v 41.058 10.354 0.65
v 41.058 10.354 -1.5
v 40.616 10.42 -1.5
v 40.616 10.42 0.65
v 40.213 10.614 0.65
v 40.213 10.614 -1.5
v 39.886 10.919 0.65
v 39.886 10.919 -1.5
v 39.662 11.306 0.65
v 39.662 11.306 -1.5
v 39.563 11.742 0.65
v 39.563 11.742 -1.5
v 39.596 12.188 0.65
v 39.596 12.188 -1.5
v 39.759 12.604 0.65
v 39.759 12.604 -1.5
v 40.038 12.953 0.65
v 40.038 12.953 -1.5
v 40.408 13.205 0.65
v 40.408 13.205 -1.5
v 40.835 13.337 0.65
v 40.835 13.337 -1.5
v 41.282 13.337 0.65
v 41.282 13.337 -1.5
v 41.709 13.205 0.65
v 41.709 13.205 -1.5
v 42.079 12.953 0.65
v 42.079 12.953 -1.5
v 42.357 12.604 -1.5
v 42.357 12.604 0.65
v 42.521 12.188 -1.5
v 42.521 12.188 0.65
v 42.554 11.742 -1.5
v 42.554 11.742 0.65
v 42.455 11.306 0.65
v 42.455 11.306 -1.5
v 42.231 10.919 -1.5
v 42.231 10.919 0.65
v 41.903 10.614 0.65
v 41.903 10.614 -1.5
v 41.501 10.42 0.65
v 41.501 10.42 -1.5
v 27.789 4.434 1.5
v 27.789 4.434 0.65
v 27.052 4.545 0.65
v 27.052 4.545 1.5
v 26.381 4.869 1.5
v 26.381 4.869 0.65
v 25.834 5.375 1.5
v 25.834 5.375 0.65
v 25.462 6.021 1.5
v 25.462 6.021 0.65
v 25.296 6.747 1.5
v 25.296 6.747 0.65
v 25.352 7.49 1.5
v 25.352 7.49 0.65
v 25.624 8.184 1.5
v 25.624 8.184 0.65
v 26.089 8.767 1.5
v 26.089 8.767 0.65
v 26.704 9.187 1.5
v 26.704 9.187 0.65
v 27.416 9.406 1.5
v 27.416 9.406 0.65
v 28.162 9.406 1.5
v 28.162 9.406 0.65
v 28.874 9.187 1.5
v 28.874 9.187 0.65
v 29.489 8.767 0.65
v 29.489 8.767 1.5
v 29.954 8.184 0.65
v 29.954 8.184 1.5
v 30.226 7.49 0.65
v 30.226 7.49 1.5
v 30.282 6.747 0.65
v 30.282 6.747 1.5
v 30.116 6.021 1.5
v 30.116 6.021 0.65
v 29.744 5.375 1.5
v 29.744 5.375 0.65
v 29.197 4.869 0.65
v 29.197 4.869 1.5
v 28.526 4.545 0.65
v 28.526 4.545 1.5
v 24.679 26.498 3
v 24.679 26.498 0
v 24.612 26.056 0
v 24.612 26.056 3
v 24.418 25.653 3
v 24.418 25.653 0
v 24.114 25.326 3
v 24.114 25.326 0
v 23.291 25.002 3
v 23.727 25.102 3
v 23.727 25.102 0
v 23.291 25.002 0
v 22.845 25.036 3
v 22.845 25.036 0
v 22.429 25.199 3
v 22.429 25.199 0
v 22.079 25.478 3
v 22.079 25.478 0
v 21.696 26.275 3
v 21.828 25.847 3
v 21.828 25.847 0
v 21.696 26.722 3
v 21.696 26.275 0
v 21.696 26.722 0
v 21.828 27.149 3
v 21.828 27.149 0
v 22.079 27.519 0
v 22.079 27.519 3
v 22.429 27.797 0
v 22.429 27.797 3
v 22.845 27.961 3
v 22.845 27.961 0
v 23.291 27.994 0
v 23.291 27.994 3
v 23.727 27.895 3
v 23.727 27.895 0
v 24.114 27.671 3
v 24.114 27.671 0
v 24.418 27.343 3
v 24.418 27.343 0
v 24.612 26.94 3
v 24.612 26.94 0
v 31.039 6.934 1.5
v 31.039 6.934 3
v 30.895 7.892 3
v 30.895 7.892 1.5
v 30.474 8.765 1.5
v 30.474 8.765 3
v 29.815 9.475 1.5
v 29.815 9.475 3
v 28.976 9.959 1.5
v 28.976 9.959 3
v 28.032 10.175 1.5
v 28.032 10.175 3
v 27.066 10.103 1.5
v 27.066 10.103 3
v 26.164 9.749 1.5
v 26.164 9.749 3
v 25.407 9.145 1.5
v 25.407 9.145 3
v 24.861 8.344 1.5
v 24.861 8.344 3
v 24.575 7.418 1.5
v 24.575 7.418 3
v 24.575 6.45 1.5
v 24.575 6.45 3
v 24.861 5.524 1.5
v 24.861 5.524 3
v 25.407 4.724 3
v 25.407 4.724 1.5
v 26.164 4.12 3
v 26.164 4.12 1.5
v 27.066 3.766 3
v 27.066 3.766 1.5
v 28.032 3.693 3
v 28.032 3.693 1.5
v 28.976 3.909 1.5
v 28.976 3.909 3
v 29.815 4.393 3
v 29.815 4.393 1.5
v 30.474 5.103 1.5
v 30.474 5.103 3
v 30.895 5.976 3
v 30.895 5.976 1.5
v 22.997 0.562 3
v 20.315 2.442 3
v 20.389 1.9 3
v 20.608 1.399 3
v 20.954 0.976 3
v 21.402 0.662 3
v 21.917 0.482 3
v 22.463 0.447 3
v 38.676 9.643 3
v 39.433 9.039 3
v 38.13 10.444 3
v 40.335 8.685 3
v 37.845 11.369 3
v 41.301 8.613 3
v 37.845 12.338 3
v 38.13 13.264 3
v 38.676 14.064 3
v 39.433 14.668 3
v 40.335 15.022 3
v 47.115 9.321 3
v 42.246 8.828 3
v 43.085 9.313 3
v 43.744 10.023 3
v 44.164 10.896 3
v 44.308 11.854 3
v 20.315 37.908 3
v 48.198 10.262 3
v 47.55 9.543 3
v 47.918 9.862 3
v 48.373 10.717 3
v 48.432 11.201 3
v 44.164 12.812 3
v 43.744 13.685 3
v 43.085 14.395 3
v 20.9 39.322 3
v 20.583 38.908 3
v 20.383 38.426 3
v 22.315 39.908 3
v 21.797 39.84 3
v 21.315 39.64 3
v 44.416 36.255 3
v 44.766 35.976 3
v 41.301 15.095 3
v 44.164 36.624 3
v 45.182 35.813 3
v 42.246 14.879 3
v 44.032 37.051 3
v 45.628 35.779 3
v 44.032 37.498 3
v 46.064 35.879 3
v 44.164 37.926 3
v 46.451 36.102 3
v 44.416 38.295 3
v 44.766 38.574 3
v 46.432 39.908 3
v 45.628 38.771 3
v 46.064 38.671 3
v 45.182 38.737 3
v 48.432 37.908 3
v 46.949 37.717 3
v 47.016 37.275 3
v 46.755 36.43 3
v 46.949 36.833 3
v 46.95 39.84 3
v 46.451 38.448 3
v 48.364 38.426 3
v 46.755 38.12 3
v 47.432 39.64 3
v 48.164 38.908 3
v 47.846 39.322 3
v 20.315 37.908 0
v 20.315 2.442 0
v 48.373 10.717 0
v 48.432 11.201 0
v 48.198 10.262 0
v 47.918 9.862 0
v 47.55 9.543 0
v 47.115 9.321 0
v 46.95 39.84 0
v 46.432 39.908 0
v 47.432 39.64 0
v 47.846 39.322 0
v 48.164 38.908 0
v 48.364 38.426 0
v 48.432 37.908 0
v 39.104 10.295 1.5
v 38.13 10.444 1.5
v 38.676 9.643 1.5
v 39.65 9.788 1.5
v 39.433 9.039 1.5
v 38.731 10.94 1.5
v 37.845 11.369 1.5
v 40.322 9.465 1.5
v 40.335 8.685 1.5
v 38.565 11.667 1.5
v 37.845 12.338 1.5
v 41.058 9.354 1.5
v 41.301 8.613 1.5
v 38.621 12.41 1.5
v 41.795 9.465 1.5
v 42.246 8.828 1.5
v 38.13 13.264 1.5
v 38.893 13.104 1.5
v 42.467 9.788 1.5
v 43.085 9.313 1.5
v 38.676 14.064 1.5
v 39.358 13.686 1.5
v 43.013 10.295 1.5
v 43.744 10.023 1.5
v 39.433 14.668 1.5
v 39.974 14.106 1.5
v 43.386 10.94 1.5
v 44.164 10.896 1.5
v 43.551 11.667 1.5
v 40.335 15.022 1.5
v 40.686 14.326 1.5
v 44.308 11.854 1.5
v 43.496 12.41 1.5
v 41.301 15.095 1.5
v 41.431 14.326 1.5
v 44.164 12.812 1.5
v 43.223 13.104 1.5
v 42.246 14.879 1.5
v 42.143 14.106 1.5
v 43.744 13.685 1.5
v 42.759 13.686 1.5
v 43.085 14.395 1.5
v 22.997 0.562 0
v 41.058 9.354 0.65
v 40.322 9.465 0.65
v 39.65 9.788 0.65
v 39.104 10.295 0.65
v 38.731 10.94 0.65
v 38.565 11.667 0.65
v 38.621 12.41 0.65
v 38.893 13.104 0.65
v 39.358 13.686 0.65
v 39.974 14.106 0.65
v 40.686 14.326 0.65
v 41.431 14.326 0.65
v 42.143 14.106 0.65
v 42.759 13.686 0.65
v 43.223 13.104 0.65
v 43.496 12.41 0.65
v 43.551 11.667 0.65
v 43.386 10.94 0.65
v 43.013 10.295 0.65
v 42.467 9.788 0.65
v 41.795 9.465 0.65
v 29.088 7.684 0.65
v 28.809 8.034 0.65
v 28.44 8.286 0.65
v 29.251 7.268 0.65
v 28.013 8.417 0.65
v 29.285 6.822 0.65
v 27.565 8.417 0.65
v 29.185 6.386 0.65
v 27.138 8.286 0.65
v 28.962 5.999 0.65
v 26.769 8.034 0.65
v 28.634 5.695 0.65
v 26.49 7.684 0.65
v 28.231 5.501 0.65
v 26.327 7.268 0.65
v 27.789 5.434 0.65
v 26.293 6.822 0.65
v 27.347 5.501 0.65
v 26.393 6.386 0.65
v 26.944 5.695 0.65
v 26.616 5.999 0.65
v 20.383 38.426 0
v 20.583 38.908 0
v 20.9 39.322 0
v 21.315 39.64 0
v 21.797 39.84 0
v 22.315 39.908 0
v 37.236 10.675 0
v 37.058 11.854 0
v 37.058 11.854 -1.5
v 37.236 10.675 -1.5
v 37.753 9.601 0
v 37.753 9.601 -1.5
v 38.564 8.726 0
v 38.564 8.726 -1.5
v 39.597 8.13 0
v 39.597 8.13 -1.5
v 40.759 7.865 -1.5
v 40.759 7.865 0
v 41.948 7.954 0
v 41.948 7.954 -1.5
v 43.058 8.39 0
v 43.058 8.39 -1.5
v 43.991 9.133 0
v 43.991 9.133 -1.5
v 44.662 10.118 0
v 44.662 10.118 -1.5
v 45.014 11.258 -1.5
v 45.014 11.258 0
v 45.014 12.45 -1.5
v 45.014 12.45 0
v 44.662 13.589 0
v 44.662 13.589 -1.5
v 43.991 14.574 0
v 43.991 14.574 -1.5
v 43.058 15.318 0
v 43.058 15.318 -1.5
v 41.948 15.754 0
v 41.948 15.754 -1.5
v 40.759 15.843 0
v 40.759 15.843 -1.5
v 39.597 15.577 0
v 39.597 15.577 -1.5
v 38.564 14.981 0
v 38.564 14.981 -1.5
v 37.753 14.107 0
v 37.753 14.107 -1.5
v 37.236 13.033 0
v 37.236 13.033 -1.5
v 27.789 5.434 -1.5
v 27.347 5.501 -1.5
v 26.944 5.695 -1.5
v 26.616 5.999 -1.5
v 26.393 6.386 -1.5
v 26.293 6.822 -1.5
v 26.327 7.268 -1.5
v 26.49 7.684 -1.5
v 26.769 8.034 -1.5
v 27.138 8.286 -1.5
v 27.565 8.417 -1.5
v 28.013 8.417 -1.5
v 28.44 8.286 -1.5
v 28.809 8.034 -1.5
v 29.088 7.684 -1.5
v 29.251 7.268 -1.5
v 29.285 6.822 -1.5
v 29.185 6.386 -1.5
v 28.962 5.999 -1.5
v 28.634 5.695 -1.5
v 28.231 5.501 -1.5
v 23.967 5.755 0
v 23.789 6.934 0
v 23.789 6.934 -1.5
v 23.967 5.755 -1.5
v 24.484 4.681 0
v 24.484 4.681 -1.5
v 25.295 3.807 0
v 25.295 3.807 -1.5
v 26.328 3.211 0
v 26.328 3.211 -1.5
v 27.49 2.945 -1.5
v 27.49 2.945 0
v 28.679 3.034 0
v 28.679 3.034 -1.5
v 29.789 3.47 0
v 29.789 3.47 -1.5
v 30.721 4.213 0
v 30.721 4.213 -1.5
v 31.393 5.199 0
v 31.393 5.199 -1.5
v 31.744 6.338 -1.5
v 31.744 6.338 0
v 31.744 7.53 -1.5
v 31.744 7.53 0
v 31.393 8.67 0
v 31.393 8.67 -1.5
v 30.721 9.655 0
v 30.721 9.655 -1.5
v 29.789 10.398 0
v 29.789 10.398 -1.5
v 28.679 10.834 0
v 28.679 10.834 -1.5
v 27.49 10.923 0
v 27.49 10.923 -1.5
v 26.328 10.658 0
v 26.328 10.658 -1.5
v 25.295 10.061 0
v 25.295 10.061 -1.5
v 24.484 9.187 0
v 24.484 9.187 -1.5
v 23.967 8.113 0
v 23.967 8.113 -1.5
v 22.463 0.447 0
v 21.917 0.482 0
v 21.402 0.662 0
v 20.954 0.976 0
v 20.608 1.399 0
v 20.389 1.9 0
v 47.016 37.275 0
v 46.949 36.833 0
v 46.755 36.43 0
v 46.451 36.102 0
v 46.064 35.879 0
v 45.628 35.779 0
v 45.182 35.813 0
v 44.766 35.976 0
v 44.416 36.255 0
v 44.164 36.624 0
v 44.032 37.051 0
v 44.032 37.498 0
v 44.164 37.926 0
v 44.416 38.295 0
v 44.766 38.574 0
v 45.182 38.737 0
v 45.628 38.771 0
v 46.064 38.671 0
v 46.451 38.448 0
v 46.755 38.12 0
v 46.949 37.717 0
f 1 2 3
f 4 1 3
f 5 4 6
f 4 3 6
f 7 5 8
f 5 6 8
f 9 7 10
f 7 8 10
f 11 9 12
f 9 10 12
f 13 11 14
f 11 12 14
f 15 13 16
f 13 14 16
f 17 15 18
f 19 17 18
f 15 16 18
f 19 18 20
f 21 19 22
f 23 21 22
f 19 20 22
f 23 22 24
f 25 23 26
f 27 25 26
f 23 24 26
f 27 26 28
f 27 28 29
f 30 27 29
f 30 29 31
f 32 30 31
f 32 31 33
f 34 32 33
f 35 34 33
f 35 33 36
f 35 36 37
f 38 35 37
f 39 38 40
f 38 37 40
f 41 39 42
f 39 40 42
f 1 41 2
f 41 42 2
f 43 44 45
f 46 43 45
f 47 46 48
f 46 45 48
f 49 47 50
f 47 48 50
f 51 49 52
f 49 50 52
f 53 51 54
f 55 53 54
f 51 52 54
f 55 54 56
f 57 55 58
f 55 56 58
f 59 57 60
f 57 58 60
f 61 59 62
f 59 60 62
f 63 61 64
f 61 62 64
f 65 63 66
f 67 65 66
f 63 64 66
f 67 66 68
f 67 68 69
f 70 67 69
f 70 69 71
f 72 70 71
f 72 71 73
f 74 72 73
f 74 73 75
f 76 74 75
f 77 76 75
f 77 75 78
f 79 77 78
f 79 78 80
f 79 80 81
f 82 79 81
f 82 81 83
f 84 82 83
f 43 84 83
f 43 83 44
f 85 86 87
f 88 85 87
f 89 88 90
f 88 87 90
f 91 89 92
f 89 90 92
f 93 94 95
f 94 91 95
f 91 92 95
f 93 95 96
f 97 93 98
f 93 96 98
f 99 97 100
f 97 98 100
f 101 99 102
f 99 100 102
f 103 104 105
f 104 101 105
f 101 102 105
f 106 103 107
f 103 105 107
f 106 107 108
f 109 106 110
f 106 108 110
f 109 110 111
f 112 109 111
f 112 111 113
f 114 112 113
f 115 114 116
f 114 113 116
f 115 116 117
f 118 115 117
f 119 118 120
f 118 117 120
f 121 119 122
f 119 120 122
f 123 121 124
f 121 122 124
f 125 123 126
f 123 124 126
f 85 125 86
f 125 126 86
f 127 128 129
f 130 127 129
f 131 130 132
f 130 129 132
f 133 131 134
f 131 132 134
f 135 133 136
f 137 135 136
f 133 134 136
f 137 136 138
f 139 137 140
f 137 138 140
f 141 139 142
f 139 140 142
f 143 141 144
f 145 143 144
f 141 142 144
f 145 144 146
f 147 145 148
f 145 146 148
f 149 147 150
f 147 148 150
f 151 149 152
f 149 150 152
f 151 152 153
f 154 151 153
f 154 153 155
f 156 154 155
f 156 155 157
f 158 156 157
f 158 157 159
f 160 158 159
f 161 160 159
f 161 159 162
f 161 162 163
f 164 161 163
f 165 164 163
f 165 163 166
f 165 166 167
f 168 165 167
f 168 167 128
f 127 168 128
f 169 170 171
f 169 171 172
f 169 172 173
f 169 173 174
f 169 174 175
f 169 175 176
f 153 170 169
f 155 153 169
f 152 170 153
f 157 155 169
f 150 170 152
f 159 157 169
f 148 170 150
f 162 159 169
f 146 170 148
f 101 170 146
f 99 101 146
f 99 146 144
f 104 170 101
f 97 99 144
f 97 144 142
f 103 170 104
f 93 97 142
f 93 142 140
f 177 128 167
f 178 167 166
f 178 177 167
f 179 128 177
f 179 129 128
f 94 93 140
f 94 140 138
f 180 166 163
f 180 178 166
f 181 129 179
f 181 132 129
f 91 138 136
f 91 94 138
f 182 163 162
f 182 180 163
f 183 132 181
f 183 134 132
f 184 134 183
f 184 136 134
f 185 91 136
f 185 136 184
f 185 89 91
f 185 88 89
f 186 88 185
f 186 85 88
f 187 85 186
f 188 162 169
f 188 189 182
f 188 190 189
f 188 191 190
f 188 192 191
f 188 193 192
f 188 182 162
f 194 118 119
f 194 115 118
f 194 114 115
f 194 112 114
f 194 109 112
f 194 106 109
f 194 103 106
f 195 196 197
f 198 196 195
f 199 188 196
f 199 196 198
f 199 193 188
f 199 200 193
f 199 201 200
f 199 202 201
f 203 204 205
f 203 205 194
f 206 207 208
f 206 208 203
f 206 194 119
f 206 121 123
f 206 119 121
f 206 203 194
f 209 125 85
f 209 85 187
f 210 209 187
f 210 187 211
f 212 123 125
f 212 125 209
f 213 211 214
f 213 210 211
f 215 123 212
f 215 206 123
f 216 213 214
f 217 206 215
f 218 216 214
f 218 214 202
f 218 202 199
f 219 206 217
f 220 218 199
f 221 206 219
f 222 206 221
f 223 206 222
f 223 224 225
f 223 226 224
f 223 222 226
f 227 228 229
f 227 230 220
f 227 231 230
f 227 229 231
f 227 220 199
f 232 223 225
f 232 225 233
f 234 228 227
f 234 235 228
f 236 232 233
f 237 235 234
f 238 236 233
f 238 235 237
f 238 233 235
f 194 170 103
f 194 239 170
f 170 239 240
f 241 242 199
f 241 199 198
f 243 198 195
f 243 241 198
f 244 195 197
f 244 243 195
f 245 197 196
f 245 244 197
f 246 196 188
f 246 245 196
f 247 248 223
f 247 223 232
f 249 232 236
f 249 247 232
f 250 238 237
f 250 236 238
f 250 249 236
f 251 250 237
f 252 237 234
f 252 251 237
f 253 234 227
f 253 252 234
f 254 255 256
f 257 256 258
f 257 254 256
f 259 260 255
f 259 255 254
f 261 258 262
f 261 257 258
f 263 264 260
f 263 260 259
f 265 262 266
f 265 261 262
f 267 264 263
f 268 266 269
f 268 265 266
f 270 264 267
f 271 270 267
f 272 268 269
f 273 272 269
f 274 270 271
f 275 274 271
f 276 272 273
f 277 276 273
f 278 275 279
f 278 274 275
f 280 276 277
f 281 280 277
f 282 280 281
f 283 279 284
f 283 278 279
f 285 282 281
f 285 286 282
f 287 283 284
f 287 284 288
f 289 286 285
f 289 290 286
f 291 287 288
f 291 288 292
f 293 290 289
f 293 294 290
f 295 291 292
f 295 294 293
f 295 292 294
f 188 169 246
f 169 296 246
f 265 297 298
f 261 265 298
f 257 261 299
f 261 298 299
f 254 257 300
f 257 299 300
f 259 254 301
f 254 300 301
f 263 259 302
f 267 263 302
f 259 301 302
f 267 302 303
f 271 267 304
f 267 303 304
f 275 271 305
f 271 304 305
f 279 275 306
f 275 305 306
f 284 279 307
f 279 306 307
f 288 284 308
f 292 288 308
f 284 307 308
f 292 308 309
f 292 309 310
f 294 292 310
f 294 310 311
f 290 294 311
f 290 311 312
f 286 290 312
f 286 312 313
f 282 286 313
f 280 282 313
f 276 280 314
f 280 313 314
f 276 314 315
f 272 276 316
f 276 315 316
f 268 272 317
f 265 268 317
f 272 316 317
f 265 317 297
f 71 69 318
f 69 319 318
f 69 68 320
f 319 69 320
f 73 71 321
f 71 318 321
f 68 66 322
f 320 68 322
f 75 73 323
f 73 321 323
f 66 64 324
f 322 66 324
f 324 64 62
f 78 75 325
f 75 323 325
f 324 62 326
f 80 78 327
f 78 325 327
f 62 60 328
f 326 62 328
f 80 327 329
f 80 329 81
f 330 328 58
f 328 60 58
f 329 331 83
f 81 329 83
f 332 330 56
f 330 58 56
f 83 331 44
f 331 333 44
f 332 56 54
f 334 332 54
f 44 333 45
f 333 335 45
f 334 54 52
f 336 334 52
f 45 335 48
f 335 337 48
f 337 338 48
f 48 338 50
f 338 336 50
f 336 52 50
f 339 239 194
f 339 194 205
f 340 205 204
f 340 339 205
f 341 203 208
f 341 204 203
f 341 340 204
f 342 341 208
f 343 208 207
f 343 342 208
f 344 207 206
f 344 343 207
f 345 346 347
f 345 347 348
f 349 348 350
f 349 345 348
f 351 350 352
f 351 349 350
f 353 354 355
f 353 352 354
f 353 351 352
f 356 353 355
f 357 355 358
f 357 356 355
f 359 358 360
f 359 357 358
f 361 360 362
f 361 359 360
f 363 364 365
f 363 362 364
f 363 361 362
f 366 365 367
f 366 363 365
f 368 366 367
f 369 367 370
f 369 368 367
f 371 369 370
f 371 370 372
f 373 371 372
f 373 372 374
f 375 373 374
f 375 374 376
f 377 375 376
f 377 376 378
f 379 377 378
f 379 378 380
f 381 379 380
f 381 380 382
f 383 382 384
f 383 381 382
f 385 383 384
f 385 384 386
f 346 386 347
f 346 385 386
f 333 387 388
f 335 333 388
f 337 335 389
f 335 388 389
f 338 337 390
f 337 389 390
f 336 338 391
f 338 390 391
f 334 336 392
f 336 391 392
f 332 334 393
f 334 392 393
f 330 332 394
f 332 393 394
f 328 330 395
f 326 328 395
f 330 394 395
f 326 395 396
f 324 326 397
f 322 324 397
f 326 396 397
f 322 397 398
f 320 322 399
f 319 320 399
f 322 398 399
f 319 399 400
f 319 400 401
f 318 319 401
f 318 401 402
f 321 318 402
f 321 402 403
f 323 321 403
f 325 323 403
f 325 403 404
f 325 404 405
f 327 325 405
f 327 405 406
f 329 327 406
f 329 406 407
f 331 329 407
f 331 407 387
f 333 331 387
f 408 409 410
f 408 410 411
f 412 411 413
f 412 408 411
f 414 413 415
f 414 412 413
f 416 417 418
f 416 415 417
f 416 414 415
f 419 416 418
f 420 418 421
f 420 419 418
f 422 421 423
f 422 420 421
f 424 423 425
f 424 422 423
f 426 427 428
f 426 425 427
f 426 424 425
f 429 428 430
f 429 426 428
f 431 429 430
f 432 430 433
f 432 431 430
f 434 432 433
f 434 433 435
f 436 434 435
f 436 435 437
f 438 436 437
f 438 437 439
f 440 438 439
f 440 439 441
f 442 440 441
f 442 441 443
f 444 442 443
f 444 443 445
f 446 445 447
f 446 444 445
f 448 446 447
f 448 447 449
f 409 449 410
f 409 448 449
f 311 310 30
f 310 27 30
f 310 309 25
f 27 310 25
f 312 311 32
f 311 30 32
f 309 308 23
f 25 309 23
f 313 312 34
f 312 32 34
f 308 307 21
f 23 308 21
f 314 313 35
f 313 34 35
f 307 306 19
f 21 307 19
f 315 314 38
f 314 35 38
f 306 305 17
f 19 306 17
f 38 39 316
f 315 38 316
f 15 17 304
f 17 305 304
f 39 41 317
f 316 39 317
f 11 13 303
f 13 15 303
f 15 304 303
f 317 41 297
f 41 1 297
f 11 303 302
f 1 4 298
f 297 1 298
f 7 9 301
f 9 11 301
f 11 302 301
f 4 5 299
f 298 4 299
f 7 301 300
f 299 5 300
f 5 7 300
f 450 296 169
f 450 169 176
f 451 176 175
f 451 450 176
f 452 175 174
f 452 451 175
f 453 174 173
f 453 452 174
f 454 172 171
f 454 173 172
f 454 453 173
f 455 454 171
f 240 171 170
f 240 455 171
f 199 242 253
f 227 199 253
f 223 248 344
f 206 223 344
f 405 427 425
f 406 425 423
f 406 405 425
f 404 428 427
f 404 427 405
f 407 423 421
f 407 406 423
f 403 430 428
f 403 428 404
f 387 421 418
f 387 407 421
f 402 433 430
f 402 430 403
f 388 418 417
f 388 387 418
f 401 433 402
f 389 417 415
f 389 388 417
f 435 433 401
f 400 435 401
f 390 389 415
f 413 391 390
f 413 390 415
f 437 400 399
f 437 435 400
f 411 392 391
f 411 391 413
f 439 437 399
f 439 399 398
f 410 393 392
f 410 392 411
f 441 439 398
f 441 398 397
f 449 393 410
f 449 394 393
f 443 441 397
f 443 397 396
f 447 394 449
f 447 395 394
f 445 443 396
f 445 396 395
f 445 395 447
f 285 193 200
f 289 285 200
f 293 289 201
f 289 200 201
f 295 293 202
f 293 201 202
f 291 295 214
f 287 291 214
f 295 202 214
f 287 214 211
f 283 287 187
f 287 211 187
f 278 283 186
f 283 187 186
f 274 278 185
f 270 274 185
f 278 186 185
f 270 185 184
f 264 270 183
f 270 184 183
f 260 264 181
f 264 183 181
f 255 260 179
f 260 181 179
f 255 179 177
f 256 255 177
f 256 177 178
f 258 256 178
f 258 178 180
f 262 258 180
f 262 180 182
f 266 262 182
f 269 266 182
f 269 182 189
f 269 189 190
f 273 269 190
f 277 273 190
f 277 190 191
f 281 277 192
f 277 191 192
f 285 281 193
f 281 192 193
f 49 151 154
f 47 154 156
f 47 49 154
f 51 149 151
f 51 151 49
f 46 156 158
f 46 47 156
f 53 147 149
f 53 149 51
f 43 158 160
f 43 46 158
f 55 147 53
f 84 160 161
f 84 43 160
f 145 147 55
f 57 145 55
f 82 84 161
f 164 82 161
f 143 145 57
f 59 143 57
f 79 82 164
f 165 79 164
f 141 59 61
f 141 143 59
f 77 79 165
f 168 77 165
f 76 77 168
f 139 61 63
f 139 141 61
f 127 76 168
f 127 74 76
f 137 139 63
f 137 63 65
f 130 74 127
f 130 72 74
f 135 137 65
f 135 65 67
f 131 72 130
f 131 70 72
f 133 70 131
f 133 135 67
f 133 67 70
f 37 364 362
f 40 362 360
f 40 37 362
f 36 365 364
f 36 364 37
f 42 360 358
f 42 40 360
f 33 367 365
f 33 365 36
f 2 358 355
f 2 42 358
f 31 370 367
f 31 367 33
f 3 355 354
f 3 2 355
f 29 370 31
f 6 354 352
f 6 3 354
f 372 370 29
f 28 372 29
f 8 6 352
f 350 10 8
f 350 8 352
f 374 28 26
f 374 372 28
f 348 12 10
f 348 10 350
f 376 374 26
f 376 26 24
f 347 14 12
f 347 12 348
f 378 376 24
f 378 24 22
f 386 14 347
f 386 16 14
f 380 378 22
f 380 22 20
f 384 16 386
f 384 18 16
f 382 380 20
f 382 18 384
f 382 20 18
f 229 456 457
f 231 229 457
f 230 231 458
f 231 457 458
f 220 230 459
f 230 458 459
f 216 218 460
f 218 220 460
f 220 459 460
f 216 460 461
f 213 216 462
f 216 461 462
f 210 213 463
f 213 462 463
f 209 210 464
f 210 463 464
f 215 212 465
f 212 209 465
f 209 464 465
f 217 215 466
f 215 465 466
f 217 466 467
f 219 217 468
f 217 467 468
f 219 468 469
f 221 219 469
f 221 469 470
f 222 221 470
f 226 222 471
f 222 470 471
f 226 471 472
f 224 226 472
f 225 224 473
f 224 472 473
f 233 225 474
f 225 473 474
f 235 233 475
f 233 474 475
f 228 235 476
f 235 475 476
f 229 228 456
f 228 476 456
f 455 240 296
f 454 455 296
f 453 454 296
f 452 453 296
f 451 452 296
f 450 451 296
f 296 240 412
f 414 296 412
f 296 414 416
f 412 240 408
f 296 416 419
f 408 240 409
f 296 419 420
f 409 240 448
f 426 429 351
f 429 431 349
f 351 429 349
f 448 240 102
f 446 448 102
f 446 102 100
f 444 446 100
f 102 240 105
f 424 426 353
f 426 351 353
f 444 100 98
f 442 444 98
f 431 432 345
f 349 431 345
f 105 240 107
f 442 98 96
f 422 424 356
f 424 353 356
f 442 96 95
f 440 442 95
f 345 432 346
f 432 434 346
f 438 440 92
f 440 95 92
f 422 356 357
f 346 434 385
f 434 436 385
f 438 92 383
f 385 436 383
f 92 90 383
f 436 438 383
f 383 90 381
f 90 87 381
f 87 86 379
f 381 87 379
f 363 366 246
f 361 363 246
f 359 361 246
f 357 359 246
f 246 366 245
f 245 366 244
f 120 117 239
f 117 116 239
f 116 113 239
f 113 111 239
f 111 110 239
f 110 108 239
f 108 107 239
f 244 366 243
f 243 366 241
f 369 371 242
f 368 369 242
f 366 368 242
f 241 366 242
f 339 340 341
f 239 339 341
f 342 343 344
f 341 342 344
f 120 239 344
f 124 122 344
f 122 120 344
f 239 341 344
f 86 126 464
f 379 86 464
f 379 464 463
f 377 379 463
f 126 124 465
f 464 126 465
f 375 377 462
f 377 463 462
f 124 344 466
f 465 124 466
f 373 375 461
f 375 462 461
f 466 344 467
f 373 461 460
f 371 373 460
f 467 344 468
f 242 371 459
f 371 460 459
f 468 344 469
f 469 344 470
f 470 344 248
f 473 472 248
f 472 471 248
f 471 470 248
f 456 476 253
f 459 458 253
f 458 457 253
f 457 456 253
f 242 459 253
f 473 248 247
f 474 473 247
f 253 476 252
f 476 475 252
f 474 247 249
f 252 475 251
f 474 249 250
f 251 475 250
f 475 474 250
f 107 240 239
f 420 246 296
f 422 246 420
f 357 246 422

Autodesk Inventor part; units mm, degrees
ref_plane "YZ Plane" through (0, 0, 0) normal (1, 0, 0) x (0, 1, 0)
ref_plane "XZ Plane" through (0, 0, 0) normal (0, 1, 0) x (-1, 0, 0)
ref_plane "XY Plane" through (0, 0, 0) normal (0, 0, 1) x (1, 0, 0)
sketch "Sketch1" plane through (0, 0, 0) normal (0, 0, 1) x (1, 0, 0)
  line L0 (0, 61.5875) -> (62, 61.5875) construction
  line L1 (62, 61.5875) -> (62, -0.4125) construction
  line L2 (62, -0.4125) -> (0, -0.4125) construction
  line L3 (0, -0.4125) -> (0, 61.5875) construction
  line L4 (48.4322, 11.2012) -> (48.4322, 37.9079)
  line L5 (20.3147, 37.9079) -> (20.3147, 2.4417)
  line L6 (24.0433, 39.9079) -> (22.3147, 39.9079)
  line L7 (46.4322, 39.9079) -> (24.0433, 39.9079)
  arc A0 (22.3147, 39.9079) -> (20.3147, 37.9079) centre (22.3147, 37.9079) ccw
  circle A1 centre (23.179, 26.4983) radius 1.5
  circle A2 centre (45.5157, 37.2749) radius 1.5
  line L8 (16.613, -7.1773) -> (12.7525, -9.2371) projected
  line L9 (22.9974, 0.5619) -> (47.1149, 9.3214)
  arc A3 (20.3147, 2.4417) -> (22.9974, 0.5619) centre (22.3147, 2.4417) ccw
  arc A4 (47.1149, 9.3214) -> (48.4322, 11.2012) centre (46.4322, 11.2012) ccw
  arc A5 (48.4322, 37.9079) -> (46.4322, 39.9079) centre (46.4322, 37.9079) ccw
  point P0 (0, 0)
  point P1 (48.4322, 39.9079)
  point P2 (48.4322, 9.7998)
  point P3 (20.3147, -0.4125)
  dimension "d9" = 62
  dimension "d18" = 2
  dimension "d19" = 3
  dimension "d20" = 3
  dimension "d27" = 28.1175
  dimension "d47" = 2
extrude "Extrusion2" add sketch "Sketch1" along normal blind 3
sketch "Sketch3" plane through (0, 0, 0) normal (0, 0, -1) x (-1, 0, 0)
  circle A0 centre (-41.0584, 11.8538) radius 4
  circle A1 centre (-27.789, 6.9341) radius 4
  point P0 (0, 0)
  dimension "d51" = 8
  dimension "d52" = 8
extrude "Extrusion4" add sketch "Sketch3" along normal blind 1.5
sketch "Sketch4" plane through (0, 0, 3) normal (0, 0, 1) x (1, 0, 0)
  circle A0 centre (27.789, 6.9341) radius 4 projected
  circle A1 centre (41.0584, 11.8538) radius 4 projected
  circle A2 centre (41.0584, 11.8538) radius 3.25
  circle A3 centre (27.789, 6.9341) radius 3.25
  point P0 (0, 0)
  dimension "d55" = 6.5
  dimension "d56" = 6.5
extrude "Extrusion5" cut sketch "Sketch4" against normal blind 1.5 contours A2 | A3
sketch "Sketch5" plane through (41.0584, 11.8538, 1.5) normal (0, 0, 1) x (1, 0, 0)
  circle A0 centre (-13.2694, -4.9197) radius 3.25 projected
  circle A1 centre (0, 0) radius 3.25 projected
  point P0 (-41.0584, -11.8538)
hole "Hole1" at (27.789, 6.9341, 1.5) at (41.0584, 11.8538, 1.5) direction (0, 0, -1) diameter 3 depth 3 tip angle 118 counterbore diameter 5 counterbore depth 0.85
properties part number "bump_switch_mount"
